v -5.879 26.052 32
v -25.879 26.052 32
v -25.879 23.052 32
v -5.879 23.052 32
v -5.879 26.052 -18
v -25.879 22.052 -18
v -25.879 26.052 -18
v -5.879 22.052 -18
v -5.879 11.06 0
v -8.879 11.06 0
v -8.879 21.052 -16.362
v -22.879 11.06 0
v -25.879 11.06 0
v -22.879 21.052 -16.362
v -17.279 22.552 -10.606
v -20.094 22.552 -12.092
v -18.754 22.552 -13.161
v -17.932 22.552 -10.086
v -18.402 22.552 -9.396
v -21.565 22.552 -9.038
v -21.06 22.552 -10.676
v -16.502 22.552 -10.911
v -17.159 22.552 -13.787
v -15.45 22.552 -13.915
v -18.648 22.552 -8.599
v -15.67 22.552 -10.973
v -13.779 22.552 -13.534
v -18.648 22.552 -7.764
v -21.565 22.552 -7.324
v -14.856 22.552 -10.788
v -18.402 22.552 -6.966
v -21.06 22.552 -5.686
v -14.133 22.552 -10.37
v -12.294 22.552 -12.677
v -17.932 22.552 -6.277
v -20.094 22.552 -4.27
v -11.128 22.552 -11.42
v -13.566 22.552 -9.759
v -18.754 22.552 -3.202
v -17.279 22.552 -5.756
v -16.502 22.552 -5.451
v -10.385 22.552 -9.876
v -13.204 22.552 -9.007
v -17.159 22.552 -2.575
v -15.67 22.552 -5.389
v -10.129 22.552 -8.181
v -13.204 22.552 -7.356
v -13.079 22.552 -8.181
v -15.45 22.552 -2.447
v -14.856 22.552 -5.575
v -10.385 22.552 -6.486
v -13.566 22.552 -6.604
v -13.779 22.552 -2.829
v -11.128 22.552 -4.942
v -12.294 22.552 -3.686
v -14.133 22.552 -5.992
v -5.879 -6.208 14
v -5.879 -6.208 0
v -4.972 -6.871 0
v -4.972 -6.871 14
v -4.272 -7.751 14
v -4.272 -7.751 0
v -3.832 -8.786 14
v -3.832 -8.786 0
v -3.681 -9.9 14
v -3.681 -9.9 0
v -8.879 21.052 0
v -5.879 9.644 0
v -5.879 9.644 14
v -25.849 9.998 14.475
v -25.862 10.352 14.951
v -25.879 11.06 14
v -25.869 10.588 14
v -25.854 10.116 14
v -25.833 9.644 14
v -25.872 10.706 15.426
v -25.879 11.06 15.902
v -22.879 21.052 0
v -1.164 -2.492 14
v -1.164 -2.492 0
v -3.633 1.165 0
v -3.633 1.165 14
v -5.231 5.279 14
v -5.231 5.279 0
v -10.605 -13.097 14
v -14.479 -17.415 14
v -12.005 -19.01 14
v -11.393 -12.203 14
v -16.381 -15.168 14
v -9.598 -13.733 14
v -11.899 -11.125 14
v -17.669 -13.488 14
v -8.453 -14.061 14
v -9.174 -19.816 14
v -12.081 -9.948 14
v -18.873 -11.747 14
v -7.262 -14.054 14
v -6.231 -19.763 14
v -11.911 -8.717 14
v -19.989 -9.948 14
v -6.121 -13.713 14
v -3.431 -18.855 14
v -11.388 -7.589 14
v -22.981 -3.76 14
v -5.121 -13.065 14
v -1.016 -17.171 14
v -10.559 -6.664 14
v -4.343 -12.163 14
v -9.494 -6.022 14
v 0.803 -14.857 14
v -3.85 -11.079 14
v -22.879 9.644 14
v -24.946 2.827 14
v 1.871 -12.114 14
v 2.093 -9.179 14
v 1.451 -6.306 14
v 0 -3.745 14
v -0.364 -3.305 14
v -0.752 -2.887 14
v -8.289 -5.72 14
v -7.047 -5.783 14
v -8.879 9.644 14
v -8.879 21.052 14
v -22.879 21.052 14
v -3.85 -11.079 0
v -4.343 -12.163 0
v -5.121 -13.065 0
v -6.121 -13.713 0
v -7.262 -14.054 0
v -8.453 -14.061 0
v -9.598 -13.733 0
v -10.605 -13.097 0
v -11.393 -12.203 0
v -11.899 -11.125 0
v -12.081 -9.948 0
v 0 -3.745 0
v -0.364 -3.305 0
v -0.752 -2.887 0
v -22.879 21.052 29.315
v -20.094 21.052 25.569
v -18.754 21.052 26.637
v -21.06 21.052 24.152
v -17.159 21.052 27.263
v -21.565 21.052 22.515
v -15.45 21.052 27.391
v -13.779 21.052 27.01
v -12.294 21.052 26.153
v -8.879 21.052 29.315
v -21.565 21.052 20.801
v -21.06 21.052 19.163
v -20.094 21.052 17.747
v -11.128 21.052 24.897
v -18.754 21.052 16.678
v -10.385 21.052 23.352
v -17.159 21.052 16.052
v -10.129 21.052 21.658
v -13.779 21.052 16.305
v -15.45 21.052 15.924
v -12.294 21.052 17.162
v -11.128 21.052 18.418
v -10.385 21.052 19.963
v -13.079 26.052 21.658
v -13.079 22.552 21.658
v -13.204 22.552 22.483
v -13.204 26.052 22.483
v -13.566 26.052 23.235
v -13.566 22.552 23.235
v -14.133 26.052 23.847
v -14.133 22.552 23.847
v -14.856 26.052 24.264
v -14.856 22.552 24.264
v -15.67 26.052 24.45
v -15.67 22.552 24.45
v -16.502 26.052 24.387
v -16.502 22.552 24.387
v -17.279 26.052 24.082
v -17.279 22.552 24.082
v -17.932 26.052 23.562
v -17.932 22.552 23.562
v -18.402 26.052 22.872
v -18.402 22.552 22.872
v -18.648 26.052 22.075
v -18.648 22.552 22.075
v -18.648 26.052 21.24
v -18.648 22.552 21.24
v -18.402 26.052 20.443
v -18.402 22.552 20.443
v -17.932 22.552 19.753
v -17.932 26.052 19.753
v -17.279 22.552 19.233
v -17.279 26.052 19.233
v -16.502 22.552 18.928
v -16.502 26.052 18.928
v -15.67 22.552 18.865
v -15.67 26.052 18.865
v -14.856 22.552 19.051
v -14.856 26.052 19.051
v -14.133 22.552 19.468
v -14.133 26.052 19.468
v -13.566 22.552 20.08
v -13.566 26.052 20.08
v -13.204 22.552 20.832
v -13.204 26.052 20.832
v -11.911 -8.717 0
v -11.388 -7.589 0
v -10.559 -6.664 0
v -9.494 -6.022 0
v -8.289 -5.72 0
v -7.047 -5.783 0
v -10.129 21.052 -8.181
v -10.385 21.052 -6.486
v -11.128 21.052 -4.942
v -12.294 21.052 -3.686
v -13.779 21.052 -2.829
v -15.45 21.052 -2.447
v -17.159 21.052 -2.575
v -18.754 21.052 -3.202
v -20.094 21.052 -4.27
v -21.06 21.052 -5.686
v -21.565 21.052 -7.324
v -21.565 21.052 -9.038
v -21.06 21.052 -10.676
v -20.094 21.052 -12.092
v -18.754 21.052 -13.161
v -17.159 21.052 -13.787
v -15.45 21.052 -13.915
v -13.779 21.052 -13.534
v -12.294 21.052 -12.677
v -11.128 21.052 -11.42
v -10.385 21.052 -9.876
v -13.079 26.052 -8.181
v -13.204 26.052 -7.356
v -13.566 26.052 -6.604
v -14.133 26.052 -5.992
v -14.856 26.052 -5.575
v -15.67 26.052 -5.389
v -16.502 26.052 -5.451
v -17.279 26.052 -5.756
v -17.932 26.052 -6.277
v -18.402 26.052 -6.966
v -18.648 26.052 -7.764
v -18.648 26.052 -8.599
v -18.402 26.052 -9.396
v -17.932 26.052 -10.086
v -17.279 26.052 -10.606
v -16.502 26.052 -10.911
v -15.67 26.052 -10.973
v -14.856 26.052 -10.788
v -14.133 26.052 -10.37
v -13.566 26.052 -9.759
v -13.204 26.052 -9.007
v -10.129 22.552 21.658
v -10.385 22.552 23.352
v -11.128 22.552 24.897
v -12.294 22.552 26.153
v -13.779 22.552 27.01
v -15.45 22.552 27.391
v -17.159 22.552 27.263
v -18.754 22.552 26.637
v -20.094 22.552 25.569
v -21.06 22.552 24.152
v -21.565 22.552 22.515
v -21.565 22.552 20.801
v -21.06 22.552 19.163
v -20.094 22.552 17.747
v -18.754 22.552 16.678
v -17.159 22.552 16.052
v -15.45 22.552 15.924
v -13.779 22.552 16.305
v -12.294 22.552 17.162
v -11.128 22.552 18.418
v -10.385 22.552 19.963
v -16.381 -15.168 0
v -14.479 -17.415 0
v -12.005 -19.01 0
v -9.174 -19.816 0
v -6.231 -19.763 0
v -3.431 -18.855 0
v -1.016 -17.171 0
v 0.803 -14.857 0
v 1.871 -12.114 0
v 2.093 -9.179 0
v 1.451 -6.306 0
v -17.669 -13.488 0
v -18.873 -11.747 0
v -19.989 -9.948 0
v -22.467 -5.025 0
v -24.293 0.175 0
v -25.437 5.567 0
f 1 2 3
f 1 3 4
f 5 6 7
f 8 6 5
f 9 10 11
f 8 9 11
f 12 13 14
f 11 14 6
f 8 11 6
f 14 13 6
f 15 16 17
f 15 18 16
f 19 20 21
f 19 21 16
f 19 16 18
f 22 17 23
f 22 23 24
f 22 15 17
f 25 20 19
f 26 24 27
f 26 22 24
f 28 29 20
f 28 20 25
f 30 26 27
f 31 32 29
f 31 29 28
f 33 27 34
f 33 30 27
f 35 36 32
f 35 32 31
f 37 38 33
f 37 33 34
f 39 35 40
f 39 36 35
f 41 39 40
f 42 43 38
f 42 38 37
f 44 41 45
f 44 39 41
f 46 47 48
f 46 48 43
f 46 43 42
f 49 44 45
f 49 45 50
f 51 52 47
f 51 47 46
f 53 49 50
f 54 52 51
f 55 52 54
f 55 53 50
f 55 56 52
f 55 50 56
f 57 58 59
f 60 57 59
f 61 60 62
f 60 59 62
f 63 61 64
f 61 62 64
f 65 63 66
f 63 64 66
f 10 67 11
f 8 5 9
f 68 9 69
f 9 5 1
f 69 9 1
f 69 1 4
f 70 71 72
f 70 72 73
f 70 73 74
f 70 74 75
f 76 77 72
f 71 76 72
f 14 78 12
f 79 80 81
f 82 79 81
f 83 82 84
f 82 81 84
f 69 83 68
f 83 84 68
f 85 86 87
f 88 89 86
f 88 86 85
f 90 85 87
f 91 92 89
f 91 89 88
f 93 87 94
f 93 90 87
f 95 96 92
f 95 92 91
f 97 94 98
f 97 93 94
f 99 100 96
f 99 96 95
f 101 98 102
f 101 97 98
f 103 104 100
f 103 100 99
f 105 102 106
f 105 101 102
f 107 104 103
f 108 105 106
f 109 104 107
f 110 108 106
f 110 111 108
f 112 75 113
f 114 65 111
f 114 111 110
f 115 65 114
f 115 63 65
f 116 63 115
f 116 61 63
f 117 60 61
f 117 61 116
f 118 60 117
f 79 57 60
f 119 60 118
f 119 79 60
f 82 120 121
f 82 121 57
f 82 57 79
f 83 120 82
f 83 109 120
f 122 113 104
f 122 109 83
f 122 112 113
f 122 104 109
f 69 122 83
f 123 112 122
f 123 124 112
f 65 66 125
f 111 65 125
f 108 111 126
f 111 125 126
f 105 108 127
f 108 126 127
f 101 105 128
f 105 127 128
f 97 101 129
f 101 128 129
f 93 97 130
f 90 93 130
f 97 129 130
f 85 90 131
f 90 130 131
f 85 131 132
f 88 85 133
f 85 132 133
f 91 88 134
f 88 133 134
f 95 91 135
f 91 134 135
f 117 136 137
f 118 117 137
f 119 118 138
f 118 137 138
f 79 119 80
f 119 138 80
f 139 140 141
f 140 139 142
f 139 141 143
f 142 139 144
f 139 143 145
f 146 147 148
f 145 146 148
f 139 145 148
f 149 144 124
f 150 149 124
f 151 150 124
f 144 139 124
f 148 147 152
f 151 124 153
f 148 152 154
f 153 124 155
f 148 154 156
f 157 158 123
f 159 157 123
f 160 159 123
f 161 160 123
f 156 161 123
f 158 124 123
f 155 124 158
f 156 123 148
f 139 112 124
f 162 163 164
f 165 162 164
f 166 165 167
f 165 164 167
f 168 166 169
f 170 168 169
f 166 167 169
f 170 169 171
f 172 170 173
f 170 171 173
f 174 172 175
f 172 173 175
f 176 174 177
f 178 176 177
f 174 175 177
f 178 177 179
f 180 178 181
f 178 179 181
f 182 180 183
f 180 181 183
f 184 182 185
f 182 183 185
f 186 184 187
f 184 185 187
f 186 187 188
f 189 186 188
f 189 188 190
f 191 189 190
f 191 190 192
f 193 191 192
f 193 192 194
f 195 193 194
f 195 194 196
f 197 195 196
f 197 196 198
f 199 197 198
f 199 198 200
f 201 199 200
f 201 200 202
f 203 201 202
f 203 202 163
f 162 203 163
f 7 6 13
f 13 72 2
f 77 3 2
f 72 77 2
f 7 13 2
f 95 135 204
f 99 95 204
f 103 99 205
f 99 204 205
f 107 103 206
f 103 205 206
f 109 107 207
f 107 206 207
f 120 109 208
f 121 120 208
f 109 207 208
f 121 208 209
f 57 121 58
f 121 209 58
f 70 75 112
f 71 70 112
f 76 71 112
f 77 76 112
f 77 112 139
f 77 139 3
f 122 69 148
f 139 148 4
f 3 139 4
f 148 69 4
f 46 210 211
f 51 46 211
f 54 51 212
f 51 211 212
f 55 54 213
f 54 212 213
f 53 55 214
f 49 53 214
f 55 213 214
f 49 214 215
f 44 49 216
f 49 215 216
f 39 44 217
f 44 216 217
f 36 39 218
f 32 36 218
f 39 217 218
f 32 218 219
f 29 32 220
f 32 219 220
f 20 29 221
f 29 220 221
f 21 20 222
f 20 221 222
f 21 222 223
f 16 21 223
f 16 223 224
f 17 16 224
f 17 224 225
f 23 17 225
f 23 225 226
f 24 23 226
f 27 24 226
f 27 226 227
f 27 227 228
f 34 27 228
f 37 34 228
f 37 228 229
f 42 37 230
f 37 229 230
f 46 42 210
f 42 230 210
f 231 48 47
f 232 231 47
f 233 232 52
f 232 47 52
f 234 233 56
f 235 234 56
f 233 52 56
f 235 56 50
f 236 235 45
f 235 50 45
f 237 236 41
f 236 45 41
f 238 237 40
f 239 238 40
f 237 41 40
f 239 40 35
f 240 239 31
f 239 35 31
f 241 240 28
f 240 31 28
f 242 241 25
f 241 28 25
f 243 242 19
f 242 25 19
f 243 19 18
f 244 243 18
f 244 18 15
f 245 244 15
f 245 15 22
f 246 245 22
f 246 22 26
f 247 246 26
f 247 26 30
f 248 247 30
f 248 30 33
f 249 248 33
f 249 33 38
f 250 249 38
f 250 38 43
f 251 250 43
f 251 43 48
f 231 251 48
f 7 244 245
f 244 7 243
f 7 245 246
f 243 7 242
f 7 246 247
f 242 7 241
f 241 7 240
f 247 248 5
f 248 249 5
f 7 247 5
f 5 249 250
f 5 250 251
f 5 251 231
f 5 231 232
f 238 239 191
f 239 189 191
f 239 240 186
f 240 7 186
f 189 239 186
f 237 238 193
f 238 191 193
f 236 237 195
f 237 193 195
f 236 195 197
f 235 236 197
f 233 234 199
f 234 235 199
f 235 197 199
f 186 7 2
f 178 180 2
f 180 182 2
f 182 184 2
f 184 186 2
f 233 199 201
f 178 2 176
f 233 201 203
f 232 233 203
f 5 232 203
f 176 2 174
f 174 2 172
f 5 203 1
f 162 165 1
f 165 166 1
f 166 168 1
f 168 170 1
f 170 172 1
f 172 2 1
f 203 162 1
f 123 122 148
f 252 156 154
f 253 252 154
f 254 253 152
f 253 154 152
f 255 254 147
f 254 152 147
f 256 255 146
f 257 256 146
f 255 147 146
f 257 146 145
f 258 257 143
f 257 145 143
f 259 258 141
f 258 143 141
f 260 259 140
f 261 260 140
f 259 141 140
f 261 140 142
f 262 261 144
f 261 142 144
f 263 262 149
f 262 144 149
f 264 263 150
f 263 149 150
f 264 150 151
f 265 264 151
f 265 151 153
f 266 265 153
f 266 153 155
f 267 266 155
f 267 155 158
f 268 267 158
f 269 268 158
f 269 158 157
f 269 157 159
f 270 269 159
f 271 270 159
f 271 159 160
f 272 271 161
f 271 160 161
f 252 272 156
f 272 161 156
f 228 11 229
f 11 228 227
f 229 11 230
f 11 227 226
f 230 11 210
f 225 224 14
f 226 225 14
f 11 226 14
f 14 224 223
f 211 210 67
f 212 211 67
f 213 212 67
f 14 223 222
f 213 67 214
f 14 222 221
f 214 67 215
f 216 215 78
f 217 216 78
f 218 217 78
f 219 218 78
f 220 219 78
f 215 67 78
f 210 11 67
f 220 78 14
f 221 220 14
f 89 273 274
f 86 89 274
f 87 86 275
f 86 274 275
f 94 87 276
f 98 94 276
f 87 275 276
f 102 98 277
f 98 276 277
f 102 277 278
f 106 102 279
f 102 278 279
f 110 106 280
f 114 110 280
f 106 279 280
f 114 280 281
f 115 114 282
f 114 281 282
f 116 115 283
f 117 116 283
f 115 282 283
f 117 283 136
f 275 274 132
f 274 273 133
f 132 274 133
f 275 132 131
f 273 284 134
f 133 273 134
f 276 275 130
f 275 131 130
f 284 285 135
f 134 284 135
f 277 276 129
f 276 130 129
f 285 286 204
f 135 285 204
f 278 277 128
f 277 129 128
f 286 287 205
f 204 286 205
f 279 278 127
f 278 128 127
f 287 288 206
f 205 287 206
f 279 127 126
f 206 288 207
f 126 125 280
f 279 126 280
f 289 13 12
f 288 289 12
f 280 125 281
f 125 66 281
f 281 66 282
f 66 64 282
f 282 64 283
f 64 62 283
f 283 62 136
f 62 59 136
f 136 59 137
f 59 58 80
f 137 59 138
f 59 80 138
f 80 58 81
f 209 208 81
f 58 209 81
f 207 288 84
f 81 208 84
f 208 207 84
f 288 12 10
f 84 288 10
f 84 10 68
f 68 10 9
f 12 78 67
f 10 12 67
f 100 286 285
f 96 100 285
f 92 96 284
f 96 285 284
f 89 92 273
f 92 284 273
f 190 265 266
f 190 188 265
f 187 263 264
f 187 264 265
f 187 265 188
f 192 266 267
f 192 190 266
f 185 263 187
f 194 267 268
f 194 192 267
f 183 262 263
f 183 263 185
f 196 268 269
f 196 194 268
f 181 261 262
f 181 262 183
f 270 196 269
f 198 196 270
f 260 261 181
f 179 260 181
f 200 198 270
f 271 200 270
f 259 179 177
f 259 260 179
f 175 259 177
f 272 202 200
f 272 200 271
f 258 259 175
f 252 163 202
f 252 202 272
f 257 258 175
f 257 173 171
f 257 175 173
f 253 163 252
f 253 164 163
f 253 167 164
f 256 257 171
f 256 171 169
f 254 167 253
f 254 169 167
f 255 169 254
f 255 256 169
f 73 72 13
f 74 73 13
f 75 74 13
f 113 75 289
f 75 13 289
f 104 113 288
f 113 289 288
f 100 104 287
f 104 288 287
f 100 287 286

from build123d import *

# Parameters (mm, degrees)
F1_DEPTH  = 14
F2_W      = 3
F2_H      = 11.408352
F3_DEPTH  = 18
F5_DEPTH  = 25
F6_R      = 2.8
F7_DEPTH  = 25
F8_R      = 5.75
F9_DEPTH  = 1.5
F10_W     = 3
F10_H     = 9.991856
F11_DEPTH = 18
F13_DEPTH = 25
F14_R     = 2.8
F15_DEPTH = 25
F16_R     = 5.75
F17_DEPTH = 1.5


with BuildPart() as f1:
    # F0 (on Top) → F1 (new body)
    with BuildSketch(Plane.XY):
        with BuildLine():
            Line((-5.879243, 26.052212), (-25.879243, 26.052212))
            Line((-25.879243, 26.052212), (-25.879243, 11.060356))
            ThreePointArc((-25.879243, 11.060356), (-24.293036, 0.175264), (-19.988959, -9.947788))
            ThreePointArc((-19.988959, -9.947788), (-18.281685, -12.624792), (-16.380951, -15.168086))
            ThreePointArc((-16.380951, -15.168086), (-2.161149, -18.102259), (0, -3.744627))
            ThreePointArc((0, -3.744627), (-0.595324, -3.130936), (-1.163612, -2.492127))
            ThreePointArc((-1.163612, -2.492127), (-4.546963, 3.177378), (-5.879243, 9.64386))
            ThreePointArc((-5.879243, 9.64386), (-5.891908, 10.352108), (-5.879243, 11.060356))
            Line((-5.879243, 11.060356), (-5.879243, 26.052212))
        make_face()
        with BuildLine():
            ThreePointArc((-3.681243, -9.899788), (-7.857243, -14.099719), (-12.080969, -9.947788))
            ThreePointArc((-12.080969, -9.947788), (-10.050272, -6.303218), (-5.879243, -6.207635))
            ThreePointArc((-5.879243, -6.207635), (-4.272338, -7.751347), (-3.681243, -9.899788))
        make_face(mode=Mode.SUBTRACT)
        with BuildLine():
            Line((-5.879243, 9.64386), (-5.879243, 11.060356))
            ThreePointArc((-5.879243, 11.060356), (-5.891908, 10.352108), (-5.879243, 9.64386))
        make_face()
        with BuildLine():
            ThreePointArc((0, -3.744627), (-0.554991, -3.093465), (-1.163612, -2.492127))
            ThreePointArc((-1.163612, -2.492127), (-0.595324, -3.130936), (0, -3.744627))
        make_face()
    extrude(amount=F1_DEPTH)

    # F2 (on face) → F3 (join)
    with BuildSketch(Plane.XY.offset(14)):
        Polygon((-5.879243, 26.052212), (-25.879243, 26.052212), (-25.879243, 21.052212), (-22.879243, 21.052212), (-8.879243, 21.052212), (-5.879243, 21.052212), align=None)
        with BuildLine():
            Line((-22.879243, 21.052212), (-25.879243, 21.052212))
            Line((-25.879243, 21.052212), (-25.879243, 11.060356))
            ThreePointArc((-25.879243, 11.060356), (-25.862016, 10.351917), (-25.83308, 9.64386))
            Line((-25.83308, 9.64386), (-22.879243, 9.64386))
            Line((-22.879243, 9.64386), (-22.879243, 21.052212))
        make_face()
        with Locations((-7.379243, 15.348036)):
            Rectangle(F2_W, F2_H)
    extrude(amount=F3_DEPTH)

    # F4 (on face) → F5 (cut)
    with BuildSketch(Plane.YZ.offset(-5.879243)):
        Polygon((9.64386, 14), (23.052212, 32), (9.64386, 32), align=None)
    extrude(amount=-F5_DEPTH, mode=Mode.SUBTRACT)

    # F6 (on face) → F7 (cut)
    with BuildSketch(Plane.XZ.offset(-21.052212)):
        with Locations((-15.879243, 21.657553)):
            Circle(F6_R)
    extrude(amount=-F7_DEPTH, mode=Mode.SUBTRACT)

    # F8 (on face) → F9 (cut)
    with BuildSketch(Plane.XZ.offset(-21.052212)):
        with Locations((-15.879243, 21.657553)):
            Circle(F8_R)
    extrude(amount=-F9_DEPTH, mode=Mode.SUBTRACT)

    # F10 (on face) → F11 (join)
    with BuildSketch(Plane(origin=(0, 0, 0), x_dir=(1, 0, 0), z_dir=(0, 0, -1))):
        with Locations((-24.379243, -16.056284)):
            Rectangle(F10_W, F10_H)
        Polygon((-25.879243, -21.052212), (-25.879243, -26.052212), (-5.879243, -26.052212), (-5.879243, -21.052212), (-8.879243, -21.052212), (-22.879243, -21.052212), align=None)
        with Locations((-7.379243, -16.056284)):
            Rectangle(F10_W, F10_H)
    extrude(amount=F11_DEPTH)

    # F12 (on face) → F13 (cut)
    with BuildSketch(Plane(origin=(-25.879243, 0, 0), x_dir=(0, -1, 0), z_dir=(-1, 0, 0))):
        Polygon((-11.060356, 0), (-22.052212, -18), (-11.060356, -18), align=None)
    extrude(amount=-F13_DEPTH, mode=Mode.SUBTRACT)

    # F14 (on face) → F15 (cut)
    with BuildSketch(Plane.XZ.offset(-21.052212)):
        with Locations((-15.879243, -8.181212)):
            Circle(F14_R)
    extrude(amount=-F15_DEPTH, mode=Mode.SUBTRACT)

    # F16 (on face) → F17 (cut)
    with BuildSketch(Plane.XZ.offset(-21.052212)):
        with Locations((-15.879243, -8.181212)):
            Circle(F16_R)
    extrude(amount=-F17_DEPTH, mode=Mode.SUBTRACT)


solid = f1.part
